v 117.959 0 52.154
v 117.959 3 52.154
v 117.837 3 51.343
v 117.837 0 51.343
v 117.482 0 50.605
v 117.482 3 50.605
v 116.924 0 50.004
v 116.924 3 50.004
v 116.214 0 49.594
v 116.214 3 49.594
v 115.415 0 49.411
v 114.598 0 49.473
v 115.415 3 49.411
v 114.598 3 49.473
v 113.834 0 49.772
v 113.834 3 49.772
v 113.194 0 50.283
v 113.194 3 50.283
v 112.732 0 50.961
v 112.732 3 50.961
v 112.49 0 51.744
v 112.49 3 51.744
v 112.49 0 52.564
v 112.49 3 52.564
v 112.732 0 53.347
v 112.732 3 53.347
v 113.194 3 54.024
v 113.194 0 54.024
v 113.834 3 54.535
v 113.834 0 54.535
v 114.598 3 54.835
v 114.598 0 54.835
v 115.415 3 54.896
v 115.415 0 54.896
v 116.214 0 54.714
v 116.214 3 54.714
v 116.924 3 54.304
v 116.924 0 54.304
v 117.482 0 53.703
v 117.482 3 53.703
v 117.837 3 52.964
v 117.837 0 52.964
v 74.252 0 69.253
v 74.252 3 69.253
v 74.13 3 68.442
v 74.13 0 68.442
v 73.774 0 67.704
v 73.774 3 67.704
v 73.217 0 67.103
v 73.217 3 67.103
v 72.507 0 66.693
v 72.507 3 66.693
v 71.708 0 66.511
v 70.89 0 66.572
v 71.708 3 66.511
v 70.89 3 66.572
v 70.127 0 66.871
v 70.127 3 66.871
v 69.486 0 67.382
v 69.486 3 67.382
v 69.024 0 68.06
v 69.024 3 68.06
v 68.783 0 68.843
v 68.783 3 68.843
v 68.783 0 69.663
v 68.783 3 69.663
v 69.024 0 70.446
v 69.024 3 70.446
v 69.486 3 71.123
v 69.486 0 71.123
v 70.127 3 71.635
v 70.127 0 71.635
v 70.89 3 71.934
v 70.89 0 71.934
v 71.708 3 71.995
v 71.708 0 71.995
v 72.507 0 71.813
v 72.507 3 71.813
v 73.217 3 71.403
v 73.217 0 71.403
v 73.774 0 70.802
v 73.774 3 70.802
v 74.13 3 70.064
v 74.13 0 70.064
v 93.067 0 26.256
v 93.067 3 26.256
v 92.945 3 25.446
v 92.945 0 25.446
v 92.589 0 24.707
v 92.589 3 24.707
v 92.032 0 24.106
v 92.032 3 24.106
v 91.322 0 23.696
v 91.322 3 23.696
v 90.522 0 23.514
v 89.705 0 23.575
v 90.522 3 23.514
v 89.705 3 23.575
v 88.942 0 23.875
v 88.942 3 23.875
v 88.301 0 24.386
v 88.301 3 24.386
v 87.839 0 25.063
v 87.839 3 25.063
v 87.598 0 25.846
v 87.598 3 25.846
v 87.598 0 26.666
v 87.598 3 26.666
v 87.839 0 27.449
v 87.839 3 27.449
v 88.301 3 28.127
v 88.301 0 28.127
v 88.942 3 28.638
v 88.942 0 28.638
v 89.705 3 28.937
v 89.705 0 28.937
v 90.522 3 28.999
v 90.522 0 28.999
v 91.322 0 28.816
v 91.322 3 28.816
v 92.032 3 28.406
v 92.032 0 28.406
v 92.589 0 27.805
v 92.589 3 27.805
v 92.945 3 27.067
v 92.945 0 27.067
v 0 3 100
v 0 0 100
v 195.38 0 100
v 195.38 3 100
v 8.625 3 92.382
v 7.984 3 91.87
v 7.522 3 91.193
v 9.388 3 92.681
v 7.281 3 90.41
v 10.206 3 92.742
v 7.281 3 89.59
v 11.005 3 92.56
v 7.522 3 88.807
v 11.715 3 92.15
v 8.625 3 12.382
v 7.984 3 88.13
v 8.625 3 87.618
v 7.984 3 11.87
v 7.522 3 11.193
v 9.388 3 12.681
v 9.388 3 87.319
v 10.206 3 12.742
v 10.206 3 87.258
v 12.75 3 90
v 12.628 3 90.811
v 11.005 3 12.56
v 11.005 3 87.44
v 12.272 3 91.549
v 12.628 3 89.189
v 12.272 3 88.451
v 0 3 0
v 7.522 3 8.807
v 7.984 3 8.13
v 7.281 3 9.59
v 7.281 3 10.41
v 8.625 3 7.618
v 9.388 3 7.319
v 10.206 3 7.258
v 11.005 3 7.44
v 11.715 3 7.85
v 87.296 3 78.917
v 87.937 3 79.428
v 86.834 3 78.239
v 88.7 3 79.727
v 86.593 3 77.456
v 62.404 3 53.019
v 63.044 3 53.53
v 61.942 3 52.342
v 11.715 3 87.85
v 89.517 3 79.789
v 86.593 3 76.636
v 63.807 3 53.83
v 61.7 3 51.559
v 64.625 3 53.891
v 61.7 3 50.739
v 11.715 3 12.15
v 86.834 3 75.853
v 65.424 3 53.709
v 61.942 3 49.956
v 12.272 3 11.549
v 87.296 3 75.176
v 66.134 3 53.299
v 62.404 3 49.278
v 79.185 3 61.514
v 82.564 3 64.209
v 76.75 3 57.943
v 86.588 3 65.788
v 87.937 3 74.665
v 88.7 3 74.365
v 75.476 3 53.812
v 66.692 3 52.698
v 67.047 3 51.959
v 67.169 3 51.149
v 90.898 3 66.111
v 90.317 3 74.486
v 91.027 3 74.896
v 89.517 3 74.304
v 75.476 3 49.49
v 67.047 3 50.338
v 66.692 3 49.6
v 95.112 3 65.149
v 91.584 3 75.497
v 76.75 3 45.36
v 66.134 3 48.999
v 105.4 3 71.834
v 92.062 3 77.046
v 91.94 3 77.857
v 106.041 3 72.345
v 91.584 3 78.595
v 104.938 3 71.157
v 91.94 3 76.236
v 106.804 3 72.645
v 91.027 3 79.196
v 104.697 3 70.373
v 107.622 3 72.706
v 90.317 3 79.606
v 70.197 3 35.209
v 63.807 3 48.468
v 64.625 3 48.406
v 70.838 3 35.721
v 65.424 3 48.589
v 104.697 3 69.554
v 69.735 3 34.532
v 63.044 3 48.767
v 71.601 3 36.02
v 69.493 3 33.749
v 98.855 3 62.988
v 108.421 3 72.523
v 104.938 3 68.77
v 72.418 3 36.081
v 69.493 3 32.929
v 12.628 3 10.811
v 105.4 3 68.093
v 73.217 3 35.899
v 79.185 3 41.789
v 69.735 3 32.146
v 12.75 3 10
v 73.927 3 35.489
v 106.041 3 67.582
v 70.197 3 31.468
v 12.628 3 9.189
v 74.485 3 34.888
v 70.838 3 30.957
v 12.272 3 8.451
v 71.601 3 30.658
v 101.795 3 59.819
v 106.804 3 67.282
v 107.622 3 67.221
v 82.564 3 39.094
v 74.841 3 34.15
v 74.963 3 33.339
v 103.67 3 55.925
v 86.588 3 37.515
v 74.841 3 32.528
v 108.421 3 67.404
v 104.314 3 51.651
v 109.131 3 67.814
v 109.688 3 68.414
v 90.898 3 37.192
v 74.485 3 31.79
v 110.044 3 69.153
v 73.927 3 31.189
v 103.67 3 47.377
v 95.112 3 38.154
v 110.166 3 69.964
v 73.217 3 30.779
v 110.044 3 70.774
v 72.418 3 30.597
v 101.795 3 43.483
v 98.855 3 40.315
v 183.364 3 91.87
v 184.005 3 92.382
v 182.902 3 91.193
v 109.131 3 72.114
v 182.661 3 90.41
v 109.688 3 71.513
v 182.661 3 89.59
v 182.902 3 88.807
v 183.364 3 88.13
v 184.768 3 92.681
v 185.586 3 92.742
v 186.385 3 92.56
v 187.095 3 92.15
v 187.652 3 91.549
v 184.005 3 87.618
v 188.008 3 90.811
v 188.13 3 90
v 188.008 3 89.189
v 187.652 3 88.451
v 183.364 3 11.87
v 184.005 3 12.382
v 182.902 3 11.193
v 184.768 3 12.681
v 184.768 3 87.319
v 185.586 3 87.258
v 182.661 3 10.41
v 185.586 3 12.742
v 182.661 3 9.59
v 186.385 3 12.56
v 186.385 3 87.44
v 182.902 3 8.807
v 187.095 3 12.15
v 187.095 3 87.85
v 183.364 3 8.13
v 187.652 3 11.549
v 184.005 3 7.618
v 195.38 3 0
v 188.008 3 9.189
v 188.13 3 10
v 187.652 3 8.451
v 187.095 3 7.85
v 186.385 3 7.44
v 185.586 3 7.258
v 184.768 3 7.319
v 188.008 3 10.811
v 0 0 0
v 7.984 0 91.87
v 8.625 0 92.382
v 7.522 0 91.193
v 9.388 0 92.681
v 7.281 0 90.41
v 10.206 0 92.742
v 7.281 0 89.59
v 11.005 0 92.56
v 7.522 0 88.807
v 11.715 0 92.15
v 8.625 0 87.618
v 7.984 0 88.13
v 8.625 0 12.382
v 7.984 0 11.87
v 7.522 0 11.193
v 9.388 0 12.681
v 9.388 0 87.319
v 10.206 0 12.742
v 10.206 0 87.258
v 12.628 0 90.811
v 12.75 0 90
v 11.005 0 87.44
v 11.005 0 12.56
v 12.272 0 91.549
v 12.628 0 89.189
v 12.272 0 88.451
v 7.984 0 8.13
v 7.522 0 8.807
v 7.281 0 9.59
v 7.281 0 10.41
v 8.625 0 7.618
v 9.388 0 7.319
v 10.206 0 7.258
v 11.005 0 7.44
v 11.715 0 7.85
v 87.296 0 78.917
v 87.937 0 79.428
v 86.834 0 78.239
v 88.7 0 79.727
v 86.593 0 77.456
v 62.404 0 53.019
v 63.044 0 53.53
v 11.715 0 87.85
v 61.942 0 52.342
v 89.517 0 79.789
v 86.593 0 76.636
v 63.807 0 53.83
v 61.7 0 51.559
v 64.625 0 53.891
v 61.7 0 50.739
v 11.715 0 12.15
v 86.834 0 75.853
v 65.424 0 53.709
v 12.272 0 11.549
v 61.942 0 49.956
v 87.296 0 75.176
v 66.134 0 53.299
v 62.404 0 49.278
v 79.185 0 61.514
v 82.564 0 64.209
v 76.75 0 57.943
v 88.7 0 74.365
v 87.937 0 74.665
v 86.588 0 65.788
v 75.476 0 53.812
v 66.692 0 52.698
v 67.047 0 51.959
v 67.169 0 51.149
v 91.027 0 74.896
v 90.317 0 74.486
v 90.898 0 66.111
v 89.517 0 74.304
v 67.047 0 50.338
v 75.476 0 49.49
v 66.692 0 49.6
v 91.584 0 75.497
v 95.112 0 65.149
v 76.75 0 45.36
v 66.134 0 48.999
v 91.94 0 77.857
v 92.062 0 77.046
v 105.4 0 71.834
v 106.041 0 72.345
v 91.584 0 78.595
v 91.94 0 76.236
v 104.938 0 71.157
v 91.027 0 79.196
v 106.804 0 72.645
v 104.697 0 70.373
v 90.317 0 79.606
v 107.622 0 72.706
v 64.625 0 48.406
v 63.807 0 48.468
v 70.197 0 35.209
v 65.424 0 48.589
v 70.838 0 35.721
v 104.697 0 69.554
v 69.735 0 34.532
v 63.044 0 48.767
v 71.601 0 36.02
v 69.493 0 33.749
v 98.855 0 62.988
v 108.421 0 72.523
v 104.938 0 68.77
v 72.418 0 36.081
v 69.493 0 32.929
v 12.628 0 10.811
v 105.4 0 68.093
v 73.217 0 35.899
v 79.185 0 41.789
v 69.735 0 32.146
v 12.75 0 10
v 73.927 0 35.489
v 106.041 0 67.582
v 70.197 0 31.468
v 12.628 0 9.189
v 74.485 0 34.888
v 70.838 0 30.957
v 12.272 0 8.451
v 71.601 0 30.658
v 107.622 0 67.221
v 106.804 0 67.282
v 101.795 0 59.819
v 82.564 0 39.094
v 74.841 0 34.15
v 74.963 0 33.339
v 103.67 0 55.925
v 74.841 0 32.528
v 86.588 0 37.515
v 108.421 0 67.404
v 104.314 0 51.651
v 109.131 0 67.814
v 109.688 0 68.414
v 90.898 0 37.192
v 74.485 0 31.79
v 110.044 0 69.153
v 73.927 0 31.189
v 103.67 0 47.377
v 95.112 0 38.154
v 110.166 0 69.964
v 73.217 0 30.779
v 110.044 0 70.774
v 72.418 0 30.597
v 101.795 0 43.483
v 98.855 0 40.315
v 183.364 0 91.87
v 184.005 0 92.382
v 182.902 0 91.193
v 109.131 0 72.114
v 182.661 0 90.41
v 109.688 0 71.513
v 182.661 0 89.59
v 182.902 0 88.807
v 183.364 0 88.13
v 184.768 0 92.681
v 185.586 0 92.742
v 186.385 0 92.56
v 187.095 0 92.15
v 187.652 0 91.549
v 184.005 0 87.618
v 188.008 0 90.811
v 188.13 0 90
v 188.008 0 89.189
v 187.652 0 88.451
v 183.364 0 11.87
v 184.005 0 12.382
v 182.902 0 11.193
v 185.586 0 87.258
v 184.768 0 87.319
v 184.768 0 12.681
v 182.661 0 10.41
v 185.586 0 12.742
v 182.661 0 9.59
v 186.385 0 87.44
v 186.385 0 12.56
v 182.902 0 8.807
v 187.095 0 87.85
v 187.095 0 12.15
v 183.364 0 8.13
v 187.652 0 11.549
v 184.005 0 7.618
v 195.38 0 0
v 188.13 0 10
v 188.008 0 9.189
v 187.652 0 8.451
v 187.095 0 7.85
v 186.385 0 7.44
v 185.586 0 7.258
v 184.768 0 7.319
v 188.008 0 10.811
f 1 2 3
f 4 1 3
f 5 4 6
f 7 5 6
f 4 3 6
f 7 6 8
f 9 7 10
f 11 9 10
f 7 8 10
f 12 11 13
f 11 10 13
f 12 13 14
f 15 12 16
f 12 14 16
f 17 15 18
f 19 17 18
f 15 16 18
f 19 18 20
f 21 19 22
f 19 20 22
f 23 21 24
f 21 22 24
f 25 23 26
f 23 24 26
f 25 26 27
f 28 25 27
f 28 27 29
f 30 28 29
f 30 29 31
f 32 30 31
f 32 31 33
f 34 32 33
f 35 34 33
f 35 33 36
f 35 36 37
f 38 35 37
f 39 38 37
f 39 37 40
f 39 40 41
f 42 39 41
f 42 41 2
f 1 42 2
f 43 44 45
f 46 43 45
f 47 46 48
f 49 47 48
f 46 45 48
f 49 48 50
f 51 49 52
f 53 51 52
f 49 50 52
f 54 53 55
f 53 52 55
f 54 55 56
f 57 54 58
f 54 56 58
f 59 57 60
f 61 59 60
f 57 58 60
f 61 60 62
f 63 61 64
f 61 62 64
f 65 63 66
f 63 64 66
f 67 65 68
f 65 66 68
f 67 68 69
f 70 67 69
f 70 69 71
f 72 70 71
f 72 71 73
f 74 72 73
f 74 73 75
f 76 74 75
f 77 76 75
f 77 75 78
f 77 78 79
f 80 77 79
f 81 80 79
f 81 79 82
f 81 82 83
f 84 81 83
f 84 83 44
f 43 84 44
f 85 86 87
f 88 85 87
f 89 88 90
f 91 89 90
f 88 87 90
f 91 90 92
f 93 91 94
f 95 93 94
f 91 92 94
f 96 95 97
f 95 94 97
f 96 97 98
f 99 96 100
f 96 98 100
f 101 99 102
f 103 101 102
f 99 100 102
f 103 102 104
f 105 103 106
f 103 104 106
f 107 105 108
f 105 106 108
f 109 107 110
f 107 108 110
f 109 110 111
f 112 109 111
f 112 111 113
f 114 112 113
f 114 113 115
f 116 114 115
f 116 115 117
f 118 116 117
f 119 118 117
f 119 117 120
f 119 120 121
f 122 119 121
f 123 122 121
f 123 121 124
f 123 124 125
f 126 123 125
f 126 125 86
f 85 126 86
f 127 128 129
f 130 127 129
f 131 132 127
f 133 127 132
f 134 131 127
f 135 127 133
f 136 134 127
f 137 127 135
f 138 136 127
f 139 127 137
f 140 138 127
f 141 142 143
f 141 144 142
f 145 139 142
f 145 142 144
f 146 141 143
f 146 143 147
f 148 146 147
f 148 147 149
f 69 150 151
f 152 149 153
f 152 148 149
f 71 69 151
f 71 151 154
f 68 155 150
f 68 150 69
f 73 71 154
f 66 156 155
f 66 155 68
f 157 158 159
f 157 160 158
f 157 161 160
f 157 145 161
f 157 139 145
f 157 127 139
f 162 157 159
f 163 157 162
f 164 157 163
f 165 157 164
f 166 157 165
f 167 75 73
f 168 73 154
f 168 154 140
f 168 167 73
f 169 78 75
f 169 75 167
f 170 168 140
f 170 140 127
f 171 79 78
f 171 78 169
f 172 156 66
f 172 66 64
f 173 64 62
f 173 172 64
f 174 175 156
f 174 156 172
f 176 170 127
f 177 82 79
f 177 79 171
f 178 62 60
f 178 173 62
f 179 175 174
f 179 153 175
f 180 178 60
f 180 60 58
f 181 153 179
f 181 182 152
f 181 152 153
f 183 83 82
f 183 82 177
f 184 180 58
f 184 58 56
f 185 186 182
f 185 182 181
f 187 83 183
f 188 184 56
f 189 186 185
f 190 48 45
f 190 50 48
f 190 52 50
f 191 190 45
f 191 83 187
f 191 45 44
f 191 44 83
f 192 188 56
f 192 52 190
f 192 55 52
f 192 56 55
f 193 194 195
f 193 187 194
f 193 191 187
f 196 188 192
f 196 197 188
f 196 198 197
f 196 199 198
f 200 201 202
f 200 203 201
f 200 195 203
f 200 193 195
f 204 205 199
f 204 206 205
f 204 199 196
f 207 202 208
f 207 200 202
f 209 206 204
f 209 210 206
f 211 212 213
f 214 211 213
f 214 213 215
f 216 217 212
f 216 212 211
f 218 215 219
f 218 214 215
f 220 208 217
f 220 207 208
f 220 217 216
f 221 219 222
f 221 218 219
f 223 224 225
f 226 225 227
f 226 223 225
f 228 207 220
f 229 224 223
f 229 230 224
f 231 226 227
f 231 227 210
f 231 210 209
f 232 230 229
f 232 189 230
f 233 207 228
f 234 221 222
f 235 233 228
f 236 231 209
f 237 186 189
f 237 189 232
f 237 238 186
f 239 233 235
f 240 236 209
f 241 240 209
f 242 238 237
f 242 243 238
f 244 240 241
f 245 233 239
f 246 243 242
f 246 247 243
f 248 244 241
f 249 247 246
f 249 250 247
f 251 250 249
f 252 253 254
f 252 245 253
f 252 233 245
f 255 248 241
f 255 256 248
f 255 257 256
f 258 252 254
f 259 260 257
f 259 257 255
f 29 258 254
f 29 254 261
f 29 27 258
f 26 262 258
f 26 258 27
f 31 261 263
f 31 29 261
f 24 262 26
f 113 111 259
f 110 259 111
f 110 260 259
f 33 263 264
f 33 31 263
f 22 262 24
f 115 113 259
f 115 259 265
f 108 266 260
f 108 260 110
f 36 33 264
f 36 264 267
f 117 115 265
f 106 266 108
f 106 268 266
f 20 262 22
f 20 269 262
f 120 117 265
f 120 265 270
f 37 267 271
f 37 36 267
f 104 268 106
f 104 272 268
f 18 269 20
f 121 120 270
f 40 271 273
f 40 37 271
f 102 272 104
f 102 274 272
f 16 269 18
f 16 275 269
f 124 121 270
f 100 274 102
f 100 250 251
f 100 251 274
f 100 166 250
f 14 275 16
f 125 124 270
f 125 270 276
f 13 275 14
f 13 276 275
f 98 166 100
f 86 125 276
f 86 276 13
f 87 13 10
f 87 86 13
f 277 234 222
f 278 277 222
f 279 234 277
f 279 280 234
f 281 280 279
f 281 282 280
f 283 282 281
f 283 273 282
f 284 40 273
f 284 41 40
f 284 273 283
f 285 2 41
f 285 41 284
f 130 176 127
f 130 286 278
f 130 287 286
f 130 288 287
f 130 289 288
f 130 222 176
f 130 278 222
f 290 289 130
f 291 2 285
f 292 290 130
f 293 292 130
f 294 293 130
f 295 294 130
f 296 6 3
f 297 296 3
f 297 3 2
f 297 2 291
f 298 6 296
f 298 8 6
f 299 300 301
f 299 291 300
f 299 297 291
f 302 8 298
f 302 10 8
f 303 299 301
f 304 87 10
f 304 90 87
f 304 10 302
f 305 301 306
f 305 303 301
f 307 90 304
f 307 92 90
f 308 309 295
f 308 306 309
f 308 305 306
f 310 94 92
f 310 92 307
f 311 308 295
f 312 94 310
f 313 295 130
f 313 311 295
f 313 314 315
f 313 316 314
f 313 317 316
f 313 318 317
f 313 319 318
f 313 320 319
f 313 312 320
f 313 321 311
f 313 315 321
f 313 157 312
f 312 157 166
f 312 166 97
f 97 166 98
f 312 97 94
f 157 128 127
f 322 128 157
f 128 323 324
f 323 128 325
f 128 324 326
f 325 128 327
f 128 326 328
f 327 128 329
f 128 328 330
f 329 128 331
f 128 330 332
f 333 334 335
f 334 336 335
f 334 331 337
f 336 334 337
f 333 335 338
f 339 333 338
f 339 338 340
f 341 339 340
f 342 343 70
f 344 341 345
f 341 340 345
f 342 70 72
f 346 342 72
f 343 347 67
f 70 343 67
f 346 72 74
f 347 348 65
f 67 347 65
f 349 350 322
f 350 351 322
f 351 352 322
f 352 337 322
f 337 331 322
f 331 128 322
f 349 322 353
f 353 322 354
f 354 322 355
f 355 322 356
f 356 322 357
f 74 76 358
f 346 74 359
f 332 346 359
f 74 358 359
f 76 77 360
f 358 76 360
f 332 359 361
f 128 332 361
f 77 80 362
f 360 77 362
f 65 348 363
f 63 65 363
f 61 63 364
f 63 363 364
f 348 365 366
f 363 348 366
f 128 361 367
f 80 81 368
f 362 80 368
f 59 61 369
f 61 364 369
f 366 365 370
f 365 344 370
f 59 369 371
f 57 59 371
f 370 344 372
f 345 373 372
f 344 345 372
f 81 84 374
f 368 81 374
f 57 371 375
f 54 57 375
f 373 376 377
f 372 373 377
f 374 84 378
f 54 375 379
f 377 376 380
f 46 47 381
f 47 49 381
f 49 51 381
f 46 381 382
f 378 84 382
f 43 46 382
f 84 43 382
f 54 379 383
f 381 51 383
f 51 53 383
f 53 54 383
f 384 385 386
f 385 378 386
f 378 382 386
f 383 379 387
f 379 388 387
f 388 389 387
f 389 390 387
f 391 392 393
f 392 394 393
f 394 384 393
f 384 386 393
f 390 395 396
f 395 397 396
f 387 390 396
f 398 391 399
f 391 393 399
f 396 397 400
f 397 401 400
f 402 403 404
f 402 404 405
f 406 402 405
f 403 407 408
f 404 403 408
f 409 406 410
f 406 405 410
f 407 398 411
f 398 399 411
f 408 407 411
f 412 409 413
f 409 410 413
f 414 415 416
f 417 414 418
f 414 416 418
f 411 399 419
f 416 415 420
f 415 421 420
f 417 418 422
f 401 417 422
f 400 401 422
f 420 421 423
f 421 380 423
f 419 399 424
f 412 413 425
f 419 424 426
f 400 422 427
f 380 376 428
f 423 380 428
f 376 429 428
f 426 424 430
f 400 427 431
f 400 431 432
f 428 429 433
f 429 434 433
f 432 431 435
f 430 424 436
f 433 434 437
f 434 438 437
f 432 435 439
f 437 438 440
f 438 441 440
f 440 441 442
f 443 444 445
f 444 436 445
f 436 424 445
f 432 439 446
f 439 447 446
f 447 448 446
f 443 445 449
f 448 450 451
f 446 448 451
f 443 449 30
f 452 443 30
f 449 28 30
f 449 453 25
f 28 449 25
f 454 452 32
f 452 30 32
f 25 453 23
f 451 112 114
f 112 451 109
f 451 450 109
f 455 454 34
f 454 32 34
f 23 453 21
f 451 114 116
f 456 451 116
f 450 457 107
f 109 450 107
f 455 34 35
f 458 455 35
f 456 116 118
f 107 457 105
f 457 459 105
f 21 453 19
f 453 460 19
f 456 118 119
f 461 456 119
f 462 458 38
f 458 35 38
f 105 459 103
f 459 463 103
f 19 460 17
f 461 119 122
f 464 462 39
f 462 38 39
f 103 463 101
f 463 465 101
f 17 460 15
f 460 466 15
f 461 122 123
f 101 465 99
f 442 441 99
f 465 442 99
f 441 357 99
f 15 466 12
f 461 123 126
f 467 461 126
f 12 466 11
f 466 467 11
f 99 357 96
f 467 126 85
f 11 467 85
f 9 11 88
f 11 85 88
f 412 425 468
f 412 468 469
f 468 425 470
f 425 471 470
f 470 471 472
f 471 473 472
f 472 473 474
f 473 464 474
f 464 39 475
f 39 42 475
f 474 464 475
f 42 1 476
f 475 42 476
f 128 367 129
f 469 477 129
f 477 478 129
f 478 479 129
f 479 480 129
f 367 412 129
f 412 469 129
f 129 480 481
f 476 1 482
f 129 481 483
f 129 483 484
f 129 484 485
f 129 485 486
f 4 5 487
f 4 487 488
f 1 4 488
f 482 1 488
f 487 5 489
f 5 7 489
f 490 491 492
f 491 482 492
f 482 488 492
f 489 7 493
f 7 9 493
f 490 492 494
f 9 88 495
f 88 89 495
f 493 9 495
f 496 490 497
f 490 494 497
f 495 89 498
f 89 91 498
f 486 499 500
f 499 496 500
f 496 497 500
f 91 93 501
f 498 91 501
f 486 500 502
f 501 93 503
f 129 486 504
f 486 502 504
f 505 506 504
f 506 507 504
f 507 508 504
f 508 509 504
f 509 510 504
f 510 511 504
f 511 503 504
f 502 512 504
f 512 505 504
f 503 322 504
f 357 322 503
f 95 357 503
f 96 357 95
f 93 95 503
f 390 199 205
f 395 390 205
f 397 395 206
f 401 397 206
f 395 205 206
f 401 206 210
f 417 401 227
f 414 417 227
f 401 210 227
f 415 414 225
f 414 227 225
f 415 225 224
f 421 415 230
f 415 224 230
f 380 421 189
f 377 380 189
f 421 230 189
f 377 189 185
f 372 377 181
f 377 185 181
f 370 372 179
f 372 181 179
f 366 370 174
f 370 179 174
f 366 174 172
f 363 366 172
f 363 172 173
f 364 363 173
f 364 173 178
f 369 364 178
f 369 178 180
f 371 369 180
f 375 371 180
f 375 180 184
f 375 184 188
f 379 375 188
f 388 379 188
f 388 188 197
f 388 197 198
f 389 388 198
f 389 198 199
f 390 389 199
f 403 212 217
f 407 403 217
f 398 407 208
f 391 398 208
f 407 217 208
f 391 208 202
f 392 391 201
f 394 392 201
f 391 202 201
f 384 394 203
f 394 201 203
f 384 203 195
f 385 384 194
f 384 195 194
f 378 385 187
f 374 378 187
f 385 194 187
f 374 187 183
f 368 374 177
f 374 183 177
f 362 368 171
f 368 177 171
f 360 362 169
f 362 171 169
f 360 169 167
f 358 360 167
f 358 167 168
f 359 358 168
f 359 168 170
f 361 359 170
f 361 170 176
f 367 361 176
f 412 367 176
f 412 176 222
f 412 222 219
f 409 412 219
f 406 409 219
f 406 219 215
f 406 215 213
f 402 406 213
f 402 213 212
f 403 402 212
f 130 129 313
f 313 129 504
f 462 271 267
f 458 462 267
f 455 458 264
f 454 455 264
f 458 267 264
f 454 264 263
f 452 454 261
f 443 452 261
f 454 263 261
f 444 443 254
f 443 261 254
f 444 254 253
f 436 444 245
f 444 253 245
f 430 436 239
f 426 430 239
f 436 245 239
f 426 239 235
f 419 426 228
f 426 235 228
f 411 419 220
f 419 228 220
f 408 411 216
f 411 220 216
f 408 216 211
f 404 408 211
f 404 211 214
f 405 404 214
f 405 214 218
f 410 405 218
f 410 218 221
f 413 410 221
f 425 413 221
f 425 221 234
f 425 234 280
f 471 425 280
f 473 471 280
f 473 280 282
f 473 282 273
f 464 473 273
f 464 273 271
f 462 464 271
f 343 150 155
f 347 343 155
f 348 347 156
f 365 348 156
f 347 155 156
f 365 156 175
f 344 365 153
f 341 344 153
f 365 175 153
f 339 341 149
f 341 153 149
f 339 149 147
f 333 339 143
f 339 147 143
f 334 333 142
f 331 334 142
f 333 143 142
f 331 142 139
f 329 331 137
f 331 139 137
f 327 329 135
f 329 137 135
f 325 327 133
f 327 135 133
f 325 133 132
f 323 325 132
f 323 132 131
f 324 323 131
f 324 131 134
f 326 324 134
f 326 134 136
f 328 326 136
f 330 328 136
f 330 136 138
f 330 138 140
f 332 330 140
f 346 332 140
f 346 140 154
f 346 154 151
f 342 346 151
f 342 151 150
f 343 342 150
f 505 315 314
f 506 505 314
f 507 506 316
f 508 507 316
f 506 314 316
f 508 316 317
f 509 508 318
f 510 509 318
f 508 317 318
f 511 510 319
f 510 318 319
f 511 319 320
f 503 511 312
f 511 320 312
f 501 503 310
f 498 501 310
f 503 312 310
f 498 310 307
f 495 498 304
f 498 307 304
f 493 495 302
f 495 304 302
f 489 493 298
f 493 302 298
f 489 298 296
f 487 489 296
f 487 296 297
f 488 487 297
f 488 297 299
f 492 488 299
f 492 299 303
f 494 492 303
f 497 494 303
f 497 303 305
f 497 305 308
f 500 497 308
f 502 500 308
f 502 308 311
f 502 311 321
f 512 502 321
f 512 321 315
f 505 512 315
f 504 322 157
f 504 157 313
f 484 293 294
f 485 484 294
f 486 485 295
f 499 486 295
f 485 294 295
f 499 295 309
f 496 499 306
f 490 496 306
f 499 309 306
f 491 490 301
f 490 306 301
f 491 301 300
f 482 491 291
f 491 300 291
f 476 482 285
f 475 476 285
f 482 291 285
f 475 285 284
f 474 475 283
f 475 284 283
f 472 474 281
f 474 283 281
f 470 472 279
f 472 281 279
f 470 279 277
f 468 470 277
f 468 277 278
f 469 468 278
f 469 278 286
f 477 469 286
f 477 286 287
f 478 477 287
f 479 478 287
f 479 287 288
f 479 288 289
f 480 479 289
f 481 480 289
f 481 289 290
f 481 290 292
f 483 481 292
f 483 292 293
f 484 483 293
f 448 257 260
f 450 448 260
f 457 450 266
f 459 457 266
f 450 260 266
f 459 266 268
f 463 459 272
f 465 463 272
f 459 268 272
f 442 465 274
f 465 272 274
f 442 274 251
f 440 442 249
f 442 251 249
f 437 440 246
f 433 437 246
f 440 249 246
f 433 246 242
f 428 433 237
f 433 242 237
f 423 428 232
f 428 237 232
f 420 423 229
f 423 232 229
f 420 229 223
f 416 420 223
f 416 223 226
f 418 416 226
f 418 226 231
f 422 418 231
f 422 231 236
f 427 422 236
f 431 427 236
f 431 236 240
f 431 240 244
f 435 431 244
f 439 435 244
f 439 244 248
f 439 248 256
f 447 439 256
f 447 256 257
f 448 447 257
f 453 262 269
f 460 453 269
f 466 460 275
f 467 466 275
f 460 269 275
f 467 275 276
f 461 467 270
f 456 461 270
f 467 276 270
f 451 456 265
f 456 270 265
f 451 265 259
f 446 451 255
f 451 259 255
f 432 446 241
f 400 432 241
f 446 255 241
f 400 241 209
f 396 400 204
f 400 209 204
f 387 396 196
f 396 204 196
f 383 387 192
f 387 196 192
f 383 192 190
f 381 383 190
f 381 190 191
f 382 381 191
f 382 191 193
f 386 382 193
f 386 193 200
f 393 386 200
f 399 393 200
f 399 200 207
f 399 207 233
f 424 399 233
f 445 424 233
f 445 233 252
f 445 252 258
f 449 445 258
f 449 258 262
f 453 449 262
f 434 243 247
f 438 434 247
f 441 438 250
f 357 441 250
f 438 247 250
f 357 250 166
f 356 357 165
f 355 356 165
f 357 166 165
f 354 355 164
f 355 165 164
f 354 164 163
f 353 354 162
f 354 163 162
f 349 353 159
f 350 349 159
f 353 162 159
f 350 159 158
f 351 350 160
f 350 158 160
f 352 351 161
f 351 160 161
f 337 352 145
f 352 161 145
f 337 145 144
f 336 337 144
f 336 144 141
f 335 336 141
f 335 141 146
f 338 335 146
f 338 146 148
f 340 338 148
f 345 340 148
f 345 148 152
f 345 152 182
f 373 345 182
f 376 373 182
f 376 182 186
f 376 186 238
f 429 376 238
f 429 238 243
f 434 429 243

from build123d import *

# Parameters (mm, degrees)
SKETCH1_W           = 195.38
SKETCH1_H           = 100
BOSS_EXTRUDE1_DEPTH = 3
SKETCH2_R           = 2.75
CUT_EXTRUDE1_DEPTH  = 4
SKETCH3_R           = 2.75
SKETCH3_R_2         = 14.5
CUT_EXTRUDE2_DEPTH  = 4


with BuildPart() as part:
    # Sketch1 → Boss-Extrude1 (new body)
    with BuildSketch(Plane(origin=(0, 0, 0), x_dir=(1, 0, 0), z_dir=(0, 1, 0))):
        with Locations((97.69, -50)):
            Rectangle(SKETCH1_W, SKETCH1_H)
    extrude(amount=BOSS_EXTRUDE1_DEPTH)

    # Sketch2 → Cut-Extrude1 (cut, through all)
    with BuildSketch(Plane(origin=(0, 3, 0), x_dir=(1, 0, 0), z_dir=(0, 1, 0))):
        with Locations((185.38, -10)):
            Circle(SKETCH2_R)
        with Locations((185.38, -90)):
            Circle(SKETCH2_R)
        with Locations((10, -90)):
            Circle(SKETCH2_R)
        with Locations((10, -10)):
            Circle(SKETCH2_R)
    extrude(amount=-CUT_EXTRUDE1_DEPTH, mode=Mode.SUBTRACT)

    # Sketch3 → Cut-Extrude2 (cut, through all)
    with BuildSketch(Plane(origin=(0, 3, 0), x_dir=(1, 0, 0), z_dir=(0, 1, 0))):
        with Locations((90.316911264, -26.256219724)):
            Circle(SKETCH3_R)
        with Locations((72.212744361, -33.338953579)):
            Circle(SKETCH3_R)
        with Locations((64.419414315, -51.148781901)):
            Circle(SKETCH3_R)
        with Locations((115.209473441, -52.153716673)):
            Circle(SKETCH3_R)
        with Locations((107.416143395, -69.963544996)):
            Circle(SKETCH3_R)
        with Locations((89.311976492, -77.046278851)):
            Circle(SKETCH3_R)
        with Locations((71.50214817, -69.252948804)):
            Circle(SKETCH3_R)
        with Locations((89.814443878, -51.651249287)):
            Circle(SKETCH3_R_2)
    extrude(amount=-CUT_EXTRUDE2_DEPTH, mode=Mode.SUBTRACT)


solid = part.part
